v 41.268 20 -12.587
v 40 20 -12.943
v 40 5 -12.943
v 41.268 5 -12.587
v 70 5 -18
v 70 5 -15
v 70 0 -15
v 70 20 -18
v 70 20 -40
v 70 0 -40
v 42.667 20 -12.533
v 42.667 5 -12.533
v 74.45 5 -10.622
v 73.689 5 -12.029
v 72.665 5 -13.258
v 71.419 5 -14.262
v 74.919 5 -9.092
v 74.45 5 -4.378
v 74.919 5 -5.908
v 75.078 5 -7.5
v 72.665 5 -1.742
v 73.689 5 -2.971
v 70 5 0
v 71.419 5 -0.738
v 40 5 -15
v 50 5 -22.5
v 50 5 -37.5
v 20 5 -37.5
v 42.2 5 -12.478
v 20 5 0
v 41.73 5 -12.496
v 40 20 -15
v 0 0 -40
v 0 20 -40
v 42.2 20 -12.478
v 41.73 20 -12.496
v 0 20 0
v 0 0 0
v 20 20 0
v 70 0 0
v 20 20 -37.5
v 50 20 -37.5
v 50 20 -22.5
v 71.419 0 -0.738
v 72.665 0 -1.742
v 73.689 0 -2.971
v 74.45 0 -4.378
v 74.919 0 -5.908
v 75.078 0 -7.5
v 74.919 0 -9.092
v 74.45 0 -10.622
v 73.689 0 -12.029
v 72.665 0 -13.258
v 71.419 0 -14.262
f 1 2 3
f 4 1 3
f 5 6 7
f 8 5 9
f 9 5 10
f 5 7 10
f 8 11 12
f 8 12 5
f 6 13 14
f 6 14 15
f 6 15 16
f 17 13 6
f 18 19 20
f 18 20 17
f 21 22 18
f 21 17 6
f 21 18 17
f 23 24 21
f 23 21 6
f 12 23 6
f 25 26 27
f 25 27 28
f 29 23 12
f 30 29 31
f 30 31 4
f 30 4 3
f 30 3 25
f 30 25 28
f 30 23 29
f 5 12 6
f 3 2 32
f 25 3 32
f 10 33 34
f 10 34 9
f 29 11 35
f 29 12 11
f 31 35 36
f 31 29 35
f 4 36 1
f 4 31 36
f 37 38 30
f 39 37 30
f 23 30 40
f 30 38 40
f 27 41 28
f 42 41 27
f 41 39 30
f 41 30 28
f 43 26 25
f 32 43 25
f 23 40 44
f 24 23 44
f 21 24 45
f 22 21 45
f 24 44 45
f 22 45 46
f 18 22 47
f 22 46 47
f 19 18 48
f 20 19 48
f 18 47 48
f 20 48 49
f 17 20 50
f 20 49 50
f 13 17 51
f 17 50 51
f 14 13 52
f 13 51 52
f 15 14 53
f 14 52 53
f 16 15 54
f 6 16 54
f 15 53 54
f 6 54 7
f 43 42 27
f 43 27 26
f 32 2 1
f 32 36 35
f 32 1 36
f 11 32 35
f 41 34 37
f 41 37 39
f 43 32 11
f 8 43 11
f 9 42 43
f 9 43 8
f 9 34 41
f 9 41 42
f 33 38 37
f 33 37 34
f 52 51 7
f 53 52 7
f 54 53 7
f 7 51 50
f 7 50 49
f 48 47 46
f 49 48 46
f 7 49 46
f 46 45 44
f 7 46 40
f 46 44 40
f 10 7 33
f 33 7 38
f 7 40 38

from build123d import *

# Parameters (mm, degrees)
SKETCH1_W           = 70
SKETCH1_H           = 40
BOSS_EXTRUDE1_DEPTH = 20
CUT_EXTRUDE1_DEPTH  = 15
SKETCH3_W           = 20
SKETCH3_H           = 15
CUT_EXTRUDE2_DEPTH  = 15
CUT_EXTRUDE3_DEPTH  = 15
CHAMFER1_SIZE       = 2
CHAMFER1_SIZE2      = 0.943123045
FILLET1_R           = 3
BOSS_EXTRUDE2_DEPTH = 5


with BuildPart() as part:
    # Sketch1 → Boss-Extrude1 (new body)
    with BuildSketch(Plane(origin=(0, 0, 0), x_dir=(1, 0, 0), z_dir=(0, 1, 0))):
        with Locations((35, 20)):
            Rectangle(SKETCH1_W, SKETCH1_H)
    extrude(amount=BOSS_EXTRUDE1_DEPTH)

    # Sketch2 → Cut-Extrude1 (cut)
    with BuildSketch(Plane(origin=(0, 20, 0), x_dir=(1, 0, 0), z_dir=(0, 1, 0))):
        Polygon((20, 15), (20, 37.5), (50, 37.5), (50, 22.5), (40, 15), align=None)
    extrude(amount=-CUT_EXTRUDE1_DEPTH, mode=Mode.SUBTRACT)

    # Sketch3 → Cut-Extrude2 (cut)
    with BuildSketch(Plane(origin=(0, 20, 0), x_dir=(1, 0, 0), z_dir=(0, 1, 0))):
        with Locations((30, 7.5)):
            Rectangle(SKETCH3_W, SKETCH3_H)
    extrude(amount=-CUT_EXTRUDE2_DEPTH, mode=Mode.SUBTRACT)

    # Sketch4 → Cut-Extrude3 (cut)
    with BuildSketch(Plane(origin=(0, 20, 0), x_dir=(1, 0, 0), z_dir=(0, 1, 0))):
        Polygon((40, 12), (70, 18), (70, 0), (40, 0), align=None)
    extrude(amount=-CUT_EXTRUDE3_DEPTH, mode=Mode.SUBTRACT)

    # Chamfer1
    chamfer1_edges = [part.edges().sort_by_distance(p)[0] for p in [
        (40, 12.5, -12),
    ]]
    chamfer1_side = [part.faces().sort_by_distance(p)[0] for p in [
        (55, 12.5, -15),
    ]]
    chamfer(chamfer1_edges, length=CHAMFER1_SIZE, length2=CHAMFER1_SIZE2, reference=chamfer1_side[0])

    # Fillet1
    fillet1_edges = [part.edges().sort_by_distance(p)[0] for p in [
        (41.961161351, 12.5, -12.39223227),
    ]]
    fillet(fillet1_edges, radius=FILLET1_R)

    # Sketch5 → Boss-Extrude2 (add)
    with BuildSketch(Plane.XZ):
        with BuildLine():
            Line((70, -15), (70, 0))
            ThreePointArc((70, 0), (75.077747211, -7.5), (70, -15))
        make_face()
    extrude(amount=-BOSS_EXTRUDE2_DEPTH)


solid = part.part
